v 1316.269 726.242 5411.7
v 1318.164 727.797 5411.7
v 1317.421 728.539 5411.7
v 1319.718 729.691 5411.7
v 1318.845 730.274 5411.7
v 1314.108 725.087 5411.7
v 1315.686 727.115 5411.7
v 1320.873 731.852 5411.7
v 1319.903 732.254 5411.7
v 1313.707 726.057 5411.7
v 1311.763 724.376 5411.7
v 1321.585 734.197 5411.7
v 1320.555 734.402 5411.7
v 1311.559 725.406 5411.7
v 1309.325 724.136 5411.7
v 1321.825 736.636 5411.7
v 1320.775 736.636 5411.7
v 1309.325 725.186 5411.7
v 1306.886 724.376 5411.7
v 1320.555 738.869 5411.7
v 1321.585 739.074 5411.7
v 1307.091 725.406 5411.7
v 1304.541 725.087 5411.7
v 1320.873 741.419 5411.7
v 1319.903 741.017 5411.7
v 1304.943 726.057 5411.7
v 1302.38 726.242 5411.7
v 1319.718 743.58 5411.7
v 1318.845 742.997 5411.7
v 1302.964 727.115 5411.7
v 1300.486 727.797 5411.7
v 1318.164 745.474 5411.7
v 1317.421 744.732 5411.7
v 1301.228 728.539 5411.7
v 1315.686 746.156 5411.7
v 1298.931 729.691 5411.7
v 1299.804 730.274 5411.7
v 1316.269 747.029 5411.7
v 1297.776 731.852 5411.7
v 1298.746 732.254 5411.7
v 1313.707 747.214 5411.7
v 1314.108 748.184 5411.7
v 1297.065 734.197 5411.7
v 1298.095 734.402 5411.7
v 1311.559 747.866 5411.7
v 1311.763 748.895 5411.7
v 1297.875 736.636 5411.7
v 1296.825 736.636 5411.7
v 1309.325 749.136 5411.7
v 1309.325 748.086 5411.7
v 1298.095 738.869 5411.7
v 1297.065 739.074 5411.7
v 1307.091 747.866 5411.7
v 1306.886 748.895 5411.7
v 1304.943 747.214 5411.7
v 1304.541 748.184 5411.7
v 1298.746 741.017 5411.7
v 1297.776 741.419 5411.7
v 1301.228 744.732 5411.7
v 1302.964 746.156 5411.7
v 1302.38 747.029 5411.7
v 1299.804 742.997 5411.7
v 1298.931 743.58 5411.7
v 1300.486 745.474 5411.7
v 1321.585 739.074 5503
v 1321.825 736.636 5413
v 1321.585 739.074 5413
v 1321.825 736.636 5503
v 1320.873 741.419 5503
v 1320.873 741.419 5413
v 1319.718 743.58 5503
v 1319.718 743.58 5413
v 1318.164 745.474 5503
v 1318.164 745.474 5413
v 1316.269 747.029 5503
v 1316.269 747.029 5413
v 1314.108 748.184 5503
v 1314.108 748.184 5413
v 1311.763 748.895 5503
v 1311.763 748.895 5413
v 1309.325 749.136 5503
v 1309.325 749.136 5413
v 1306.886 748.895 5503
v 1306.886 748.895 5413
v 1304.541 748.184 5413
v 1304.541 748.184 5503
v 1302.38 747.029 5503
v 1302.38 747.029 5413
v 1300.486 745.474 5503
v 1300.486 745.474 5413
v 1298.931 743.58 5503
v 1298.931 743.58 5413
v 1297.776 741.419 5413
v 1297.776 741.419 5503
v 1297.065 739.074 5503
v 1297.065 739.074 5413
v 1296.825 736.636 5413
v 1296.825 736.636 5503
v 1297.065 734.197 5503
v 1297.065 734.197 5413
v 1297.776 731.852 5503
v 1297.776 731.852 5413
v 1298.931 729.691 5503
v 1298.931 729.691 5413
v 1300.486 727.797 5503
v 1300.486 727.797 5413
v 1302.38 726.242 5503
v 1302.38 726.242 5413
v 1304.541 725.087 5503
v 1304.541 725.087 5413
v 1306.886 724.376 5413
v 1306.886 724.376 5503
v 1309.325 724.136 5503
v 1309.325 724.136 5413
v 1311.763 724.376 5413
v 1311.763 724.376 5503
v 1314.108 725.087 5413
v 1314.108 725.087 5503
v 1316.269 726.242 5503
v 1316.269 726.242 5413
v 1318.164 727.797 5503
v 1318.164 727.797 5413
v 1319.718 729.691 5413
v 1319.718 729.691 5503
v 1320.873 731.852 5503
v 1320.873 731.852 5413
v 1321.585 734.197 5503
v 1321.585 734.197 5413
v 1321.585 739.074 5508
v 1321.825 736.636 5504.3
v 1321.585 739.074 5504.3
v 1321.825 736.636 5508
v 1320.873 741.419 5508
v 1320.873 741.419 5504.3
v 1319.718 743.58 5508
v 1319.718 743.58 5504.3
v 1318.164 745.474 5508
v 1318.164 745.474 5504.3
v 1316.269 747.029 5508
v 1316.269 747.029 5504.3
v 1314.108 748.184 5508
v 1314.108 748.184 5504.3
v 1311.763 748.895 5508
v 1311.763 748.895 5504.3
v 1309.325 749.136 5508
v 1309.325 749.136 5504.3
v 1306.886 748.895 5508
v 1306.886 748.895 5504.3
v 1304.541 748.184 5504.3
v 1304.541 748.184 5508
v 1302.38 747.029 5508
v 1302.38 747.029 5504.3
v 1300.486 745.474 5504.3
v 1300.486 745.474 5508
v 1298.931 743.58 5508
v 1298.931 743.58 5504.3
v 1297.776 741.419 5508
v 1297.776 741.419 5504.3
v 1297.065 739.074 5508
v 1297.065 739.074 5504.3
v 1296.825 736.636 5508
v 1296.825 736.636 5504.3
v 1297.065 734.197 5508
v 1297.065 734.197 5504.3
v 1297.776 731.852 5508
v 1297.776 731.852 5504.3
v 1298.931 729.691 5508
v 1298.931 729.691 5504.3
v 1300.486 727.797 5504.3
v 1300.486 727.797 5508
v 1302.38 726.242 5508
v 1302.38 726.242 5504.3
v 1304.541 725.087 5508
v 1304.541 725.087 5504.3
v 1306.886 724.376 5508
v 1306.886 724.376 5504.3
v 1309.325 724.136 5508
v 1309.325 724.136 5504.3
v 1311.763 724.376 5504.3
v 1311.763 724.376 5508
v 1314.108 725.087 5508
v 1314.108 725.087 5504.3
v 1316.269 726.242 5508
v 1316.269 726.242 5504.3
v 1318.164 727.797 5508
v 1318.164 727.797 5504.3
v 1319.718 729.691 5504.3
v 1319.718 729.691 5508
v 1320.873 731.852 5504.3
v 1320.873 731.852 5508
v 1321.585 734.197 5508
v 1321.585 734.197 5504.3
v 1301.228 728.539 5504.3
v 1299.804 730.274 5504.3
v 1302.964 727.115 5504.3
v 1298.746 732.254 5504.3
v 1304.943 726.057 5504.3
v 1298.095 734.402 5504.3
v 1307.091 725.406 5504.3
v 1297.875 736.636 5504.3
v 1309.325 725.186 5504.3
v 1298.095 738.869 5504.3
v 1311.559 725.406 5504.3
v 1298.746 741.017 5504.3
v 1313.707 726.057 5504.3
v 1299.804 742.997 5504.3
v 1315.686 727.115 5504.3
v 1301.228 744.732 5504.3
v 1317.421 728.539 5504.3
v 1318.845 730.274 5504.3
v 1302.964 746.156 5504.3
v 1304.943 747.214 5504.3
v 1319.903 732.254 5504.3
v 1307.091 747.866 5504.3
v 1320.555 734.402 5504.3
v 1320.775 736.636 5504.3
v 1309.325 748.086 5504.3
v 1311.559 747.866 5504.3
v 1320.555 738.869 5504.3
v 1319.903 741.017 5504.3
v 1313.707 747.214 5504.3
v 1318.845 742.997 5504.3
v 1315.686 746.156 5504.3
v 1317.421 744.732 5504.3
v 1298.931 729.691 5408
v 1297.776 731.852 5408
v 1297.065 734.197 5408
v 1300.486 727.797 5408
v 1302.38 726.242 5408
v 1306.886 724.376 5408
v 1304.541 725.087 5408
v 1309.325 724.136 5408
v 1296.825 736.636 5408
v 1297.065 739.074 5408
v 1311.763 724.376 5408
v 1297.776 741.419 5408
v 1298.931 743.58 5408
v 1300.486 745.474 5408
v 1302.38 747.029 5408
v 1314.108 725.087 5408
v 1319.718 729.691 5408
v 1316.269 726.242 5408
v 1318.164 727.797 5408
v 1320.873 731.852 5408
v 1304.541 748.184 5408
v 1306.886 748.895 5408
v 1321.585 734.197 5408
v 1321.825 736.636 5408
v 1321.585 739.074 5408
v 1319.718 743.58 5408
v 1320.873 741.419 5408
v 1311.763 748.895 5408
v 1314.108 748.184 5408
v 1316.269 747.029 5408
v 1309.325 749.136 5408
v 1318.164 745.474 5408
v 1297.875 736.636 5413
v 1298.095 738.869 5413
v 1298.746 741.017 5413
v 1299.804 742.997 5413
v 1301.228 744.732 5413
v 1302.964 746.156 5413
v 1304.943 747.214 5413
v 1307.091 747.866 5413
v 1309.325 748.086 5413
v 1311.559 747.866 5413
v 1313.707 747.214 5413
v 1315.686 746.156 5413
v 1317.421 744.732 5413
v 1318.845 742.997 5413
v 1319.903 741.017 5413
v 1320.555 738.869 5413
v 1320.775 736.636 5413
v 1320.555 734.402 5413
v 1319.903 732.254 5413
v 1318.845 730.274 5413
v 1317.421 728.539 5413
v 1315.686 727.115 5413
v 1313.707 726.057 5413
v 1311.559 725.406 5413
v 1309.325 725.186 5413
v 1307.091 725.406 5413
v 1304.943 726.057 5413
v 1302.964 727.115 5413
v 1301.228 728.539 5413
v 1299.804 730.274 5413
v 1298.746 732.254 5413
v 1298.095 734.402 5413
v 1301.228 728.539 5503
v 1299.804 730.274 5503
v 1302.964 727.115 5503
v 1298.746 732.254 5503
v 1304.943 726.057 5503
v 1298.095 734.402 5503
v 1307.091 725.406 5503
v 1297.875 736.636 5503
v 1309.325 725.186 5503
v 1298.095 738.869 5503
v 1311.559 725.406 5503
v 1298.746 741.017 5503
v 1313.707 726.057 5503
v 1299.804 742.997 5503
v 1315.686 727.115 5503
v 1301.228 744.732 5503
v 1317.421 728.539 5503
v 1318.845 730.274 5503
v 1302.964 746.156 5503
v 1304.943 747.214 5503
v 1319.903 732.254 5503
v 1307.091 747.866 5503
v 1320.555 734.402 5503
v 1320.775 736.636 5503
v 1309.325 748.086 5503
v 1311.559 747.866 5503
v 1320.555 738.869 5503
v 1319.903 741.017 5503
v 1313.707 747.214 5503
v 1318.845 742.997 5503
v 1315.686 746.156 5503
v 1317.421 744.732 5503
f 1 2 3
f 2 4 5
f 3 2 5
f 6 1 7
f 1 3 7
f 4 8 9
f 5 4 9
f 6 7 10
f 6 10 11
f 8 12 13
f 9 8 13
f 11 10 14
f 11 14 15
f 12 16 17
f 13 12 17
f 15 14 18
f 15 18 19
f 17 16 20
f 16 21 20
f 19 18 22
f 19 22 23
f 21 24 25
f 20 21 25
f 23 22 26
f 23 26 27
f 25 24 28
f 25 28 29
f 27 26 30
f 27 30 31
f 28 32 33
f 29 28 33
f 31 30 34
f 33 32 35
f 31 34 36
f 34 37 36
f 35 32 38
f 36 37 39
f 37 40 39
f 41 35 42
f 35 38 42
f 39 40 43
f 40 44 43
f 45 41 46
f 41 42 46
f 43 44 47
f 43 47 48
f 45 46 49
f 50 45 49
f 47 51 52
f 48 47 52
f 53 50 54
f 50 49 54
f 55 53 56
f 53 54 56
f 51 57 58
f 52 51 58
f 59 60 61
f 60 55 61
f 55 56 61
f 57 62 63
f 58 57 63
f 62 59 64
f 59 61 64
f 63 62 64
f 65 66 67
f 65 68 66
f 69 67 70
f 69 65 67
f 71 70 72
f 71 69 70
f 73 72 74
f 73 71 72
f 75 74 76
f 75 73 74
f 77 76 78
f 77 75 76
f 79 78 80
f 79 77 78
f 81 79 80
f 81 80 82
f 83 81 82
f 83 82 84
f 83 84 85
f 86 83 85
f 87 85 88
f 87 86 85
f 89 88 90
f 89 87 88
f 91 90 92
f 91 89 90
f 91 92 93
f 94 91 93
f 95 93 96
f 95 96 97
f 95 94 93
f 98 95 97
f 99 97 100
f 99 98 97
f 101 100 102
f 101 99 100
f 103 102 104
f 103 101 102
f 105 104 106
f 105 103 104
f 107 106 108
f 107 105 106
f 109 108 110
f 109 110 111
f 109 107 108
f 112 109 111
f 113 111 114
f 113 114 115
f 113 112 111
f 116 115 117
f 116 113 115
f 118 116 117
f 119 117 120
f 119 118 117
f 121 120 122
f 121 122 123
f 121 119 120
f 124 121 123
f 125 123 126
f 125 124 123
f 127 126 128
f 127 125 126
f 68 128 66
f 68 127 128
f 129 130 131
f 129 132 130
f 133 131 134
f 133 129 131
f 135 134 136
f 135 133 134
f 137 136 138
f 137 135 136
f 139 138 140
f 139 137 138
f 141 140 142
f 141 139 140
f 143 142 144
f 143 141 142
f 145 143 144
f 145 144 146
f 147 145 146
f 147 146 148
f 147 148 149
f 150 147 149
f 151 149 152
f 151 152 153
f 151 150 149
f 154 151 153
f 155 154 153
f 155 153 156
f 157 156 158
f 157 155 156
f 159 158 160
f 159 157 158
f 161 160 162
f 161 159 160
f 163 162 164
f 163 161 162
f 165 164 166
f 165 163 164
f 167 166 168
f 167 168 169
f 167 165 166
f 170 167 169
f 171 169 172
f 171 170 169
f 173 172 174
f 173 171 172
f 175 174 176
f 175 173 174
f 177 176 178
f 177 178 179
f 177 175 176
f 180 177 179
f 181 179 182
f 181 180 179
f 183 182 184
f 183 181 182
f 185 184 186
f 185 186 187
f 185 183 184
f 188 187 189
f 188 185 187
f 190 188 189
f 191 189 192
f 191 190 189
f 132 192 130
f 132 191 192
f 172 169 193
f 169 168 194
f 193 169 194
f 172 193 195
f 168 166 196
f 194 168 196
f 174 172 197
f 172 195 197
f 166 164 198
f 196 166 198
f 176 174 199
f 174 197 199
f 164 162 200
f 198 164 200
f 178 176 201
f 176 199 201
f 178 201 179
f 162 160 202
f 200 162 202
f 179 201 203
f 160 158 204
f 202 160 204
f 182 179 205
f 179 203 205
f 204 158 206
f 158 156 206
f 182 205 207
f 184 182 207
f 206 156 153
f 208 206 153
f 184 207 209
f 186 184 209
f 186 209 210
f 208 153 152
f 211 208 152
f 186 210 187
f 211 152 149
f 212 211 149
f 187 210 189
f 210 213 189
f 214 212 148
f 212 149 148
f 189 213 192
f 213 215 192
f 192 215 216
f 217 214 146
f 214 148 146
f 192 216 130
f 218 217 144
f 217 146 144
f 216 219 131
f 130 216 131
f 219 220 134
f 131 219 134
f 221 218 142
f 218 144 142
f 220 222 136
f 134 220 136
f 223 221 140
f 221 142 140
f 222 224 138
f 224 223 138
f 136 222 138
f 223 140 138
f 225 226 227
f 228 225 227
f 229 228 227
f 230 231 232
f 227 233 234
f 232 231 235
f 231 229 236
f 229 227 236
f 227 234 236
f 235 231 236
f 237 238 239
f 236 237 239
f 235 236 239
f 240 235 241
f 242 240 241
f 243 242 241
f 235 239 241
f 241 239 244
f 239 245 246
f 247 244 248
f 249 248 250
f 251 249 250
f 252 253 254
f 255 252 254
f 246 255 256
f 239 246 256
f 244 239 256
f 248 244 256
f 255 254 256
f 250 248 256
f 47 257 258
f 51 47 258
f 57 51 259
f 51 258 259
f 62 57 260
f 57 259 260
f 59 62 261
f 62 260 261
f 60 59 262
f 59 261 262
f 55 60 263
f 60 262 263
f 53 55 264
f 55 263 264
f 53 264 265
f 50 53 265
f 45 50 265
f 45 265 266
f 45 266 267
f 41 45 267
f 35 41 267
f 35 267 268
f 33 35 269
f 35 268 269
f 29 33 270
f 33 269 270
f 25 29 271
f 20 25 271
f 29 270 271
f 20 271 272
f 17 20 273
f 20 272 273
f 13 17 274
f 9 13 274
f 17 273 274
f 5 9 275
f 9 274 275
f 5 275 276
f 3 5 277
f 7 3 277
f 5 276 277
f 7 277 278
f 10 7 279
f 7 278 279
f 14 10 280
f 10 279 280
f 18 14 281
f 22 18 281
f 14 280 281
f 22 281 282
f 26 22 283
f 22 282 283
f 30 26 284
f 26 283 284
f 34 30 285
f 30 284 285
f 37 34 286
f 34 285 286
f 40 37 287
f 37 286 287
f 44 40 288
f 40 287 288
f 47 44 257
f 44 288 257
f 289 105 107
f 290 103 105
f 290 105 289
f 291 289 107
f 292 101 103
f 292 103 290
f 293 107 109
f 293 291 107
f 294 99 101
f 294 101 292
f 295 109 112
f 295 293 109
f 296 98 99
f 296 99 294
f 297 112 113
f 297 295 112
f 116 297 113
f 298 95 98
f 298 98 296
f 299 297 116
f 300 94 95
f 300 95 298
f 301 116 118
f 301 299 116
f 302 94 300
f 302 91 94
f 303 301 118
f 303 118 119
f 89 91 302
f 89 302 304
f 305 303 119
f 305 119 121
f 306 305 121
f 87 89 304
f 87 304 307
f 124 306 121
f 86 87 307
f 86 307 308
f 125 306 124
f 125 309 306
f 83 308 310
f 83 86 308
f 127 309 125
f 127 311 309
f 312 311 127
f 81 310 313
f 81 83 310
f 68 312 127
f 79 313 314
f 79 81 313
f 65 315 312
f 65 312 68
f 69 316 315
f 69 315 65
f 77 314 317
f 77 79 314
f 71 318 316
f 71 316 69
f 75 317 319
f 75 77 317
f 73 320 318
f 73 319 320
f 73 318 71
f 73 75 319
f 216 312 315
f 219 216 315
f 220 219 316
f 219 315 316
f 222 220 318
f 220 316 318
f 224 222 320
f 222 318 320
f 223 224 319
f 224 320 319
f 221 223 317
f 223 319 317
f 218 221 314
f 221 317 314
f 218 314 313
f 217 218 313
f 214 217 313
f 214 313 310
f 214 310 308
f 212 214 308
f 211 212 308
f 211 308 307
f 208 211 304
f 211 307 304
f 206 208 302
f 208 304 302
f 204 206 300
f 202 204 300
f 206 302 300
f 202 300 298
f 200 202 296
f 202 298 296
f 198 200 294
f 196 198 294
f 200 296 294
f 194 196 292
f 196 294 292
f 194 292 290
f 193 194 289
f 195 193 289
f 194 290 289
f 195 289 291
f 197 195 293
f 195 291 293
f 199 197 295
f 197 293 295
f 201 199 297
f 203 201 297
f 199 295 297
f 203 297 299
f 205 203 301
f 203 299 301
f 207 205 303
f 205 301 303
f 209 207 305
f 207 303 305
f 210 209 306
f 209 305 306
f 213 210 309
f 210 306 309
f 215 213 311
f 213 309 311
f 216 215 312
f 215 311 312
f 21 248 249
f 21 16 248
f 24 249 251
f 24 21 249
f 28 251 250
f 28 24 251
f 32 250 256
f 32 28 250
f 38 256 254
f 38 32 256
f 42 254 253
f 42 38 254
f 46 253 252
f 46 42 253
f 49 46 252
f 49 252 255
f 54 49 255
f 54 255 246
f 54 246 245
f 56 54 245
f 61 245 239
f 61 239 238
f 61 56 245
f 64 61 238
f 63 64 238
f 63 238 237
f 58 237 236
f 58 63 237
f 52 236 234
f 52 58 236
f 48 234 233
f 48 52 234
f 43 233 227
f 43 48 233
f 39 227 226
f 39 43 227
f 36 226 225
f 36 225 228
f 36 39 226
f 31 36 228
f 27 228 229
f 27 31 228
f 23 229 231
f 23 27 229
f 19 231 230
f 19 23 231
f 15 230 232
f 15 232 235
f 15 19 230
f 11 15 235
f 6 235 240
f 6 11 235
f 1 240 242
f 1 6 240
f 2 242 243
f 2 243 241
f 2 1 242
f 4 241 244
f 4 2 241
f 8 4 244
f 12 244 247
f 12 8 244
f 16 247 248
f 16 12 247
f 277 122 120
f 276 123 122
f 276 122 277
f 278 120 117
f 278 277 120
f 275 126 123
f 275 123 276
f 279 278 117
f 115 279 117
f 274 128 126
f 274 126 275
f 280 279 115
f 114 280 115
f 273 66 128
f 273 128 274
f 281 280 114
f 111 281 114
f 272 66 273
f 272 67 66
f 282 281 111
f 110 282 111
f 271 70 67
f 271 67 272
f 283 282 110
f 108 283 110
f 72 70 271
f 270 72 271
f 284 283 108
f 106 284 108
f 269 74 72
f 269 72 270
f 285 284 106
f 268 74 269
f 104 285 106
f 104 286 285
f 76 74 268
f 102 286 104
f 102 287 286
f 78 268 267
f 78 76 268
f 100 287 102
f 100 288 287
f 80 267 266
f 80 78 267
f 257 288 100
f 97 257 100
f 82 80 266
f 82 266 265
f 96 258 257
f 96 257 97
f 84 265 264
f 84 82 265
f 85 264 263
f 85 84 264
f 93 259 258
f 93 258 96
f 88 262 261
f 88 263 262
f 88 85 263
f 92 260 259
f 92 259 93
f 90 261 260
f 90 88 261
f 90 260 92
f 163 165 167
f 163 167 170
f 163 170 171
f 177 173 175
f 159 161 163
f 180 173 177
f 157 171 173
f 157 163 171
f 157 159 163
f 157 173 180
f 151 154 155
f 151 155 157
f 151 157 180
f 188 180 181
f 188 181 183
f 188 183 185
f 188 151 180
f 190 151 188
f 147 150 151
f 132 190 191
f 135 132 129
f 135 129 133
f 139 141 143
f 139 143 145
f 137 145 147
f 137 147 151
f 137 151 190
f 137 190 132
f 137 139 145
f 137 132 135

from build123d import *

# Parameters (mm, degrees)
SKETCH_1_R          = 12.5
EXTRUDE_1_DEPTH     = 5
SKETCH_1_2_R        = 12.5
EXTRUDE_2_DEPTH     = 95
SKETCH_2_OUTSIDE_W  = 48.214
SKETCH_2_OUTSIDE_H  = 48.214
SKETCH_2_OUTSIDE_R  = 11.45
CUT_EXTRUDE_1_DEPTH = 1.3
SKETCH_3_OUTSIDE_W  = 48.214
SKETCH_3_OUTSIDE_H  = 48.214
SKETCH_3_OUTSIDE_R  = 11.45
CUT_EXTRUDE_2_DEPTH = 1.3


with BuildPart() as part:
    # 草图1 → 凸台-拉伸1 (new body)
    with BuildSketch(Plane.XY.offset(5503)):
        with Locations((1309.324811799, 736.635546363)):
            Circle(SKETCH_1_R)
    extrude(amount=EXTRUDE_1_DEPTH)

    # 草图1<2> → 凸台-拉伸2 (add)
    with BuildSketch(Plane.XY.offset(5503)):
        with Locations((1309.324811799, 736.635546363)):
            Circle(SKETCH_1_2_R)
    extrude(amount=-EXTRUDE_2_DEPTH)

    # 草图2 outside → 切除-拉伸1 (cut)
    with BuildSketch(Plane.XY.offset(5503)):
        with Locations((1309.325, 736.636)):
            Rectangle(SKETCH_2_OUTSIDE_W, SKETCH_2_OUTSIDE_H)
        with Locations((1309.324811799, 736.635546363)):
            Circle(SKETCH_2_OUTSIDE_R, mode=Mode.SUBTRACT)
    extrude(amount=CUT_EXTRUDE_1_DEPTH, mode=Mode.SUBTRACT)

    # 草图3 outside → 切除-拉伸2 (cut)
    with BuildSketch(Plane(origin=(0, 0, 5413), x_dir=(-1, 0, 0), z_dir=(0, 0, -1))):
        with Locations((-1309.325, 736.636)):
            Rectangle(SKETCH_3_OUTSIDE_W, SKETCH_3_OUTSIDE_H)
        with Locations((-1309.324811799, 736.635546363)):
            Circle(SKETCH_3_OUTSIDE_R, mode=Mode.SUBTRACT)
    extrude(amount=CUT_EXTRUDE_2_DEPTH, mode=Mode.SUBTRACT)


solid = part.part
